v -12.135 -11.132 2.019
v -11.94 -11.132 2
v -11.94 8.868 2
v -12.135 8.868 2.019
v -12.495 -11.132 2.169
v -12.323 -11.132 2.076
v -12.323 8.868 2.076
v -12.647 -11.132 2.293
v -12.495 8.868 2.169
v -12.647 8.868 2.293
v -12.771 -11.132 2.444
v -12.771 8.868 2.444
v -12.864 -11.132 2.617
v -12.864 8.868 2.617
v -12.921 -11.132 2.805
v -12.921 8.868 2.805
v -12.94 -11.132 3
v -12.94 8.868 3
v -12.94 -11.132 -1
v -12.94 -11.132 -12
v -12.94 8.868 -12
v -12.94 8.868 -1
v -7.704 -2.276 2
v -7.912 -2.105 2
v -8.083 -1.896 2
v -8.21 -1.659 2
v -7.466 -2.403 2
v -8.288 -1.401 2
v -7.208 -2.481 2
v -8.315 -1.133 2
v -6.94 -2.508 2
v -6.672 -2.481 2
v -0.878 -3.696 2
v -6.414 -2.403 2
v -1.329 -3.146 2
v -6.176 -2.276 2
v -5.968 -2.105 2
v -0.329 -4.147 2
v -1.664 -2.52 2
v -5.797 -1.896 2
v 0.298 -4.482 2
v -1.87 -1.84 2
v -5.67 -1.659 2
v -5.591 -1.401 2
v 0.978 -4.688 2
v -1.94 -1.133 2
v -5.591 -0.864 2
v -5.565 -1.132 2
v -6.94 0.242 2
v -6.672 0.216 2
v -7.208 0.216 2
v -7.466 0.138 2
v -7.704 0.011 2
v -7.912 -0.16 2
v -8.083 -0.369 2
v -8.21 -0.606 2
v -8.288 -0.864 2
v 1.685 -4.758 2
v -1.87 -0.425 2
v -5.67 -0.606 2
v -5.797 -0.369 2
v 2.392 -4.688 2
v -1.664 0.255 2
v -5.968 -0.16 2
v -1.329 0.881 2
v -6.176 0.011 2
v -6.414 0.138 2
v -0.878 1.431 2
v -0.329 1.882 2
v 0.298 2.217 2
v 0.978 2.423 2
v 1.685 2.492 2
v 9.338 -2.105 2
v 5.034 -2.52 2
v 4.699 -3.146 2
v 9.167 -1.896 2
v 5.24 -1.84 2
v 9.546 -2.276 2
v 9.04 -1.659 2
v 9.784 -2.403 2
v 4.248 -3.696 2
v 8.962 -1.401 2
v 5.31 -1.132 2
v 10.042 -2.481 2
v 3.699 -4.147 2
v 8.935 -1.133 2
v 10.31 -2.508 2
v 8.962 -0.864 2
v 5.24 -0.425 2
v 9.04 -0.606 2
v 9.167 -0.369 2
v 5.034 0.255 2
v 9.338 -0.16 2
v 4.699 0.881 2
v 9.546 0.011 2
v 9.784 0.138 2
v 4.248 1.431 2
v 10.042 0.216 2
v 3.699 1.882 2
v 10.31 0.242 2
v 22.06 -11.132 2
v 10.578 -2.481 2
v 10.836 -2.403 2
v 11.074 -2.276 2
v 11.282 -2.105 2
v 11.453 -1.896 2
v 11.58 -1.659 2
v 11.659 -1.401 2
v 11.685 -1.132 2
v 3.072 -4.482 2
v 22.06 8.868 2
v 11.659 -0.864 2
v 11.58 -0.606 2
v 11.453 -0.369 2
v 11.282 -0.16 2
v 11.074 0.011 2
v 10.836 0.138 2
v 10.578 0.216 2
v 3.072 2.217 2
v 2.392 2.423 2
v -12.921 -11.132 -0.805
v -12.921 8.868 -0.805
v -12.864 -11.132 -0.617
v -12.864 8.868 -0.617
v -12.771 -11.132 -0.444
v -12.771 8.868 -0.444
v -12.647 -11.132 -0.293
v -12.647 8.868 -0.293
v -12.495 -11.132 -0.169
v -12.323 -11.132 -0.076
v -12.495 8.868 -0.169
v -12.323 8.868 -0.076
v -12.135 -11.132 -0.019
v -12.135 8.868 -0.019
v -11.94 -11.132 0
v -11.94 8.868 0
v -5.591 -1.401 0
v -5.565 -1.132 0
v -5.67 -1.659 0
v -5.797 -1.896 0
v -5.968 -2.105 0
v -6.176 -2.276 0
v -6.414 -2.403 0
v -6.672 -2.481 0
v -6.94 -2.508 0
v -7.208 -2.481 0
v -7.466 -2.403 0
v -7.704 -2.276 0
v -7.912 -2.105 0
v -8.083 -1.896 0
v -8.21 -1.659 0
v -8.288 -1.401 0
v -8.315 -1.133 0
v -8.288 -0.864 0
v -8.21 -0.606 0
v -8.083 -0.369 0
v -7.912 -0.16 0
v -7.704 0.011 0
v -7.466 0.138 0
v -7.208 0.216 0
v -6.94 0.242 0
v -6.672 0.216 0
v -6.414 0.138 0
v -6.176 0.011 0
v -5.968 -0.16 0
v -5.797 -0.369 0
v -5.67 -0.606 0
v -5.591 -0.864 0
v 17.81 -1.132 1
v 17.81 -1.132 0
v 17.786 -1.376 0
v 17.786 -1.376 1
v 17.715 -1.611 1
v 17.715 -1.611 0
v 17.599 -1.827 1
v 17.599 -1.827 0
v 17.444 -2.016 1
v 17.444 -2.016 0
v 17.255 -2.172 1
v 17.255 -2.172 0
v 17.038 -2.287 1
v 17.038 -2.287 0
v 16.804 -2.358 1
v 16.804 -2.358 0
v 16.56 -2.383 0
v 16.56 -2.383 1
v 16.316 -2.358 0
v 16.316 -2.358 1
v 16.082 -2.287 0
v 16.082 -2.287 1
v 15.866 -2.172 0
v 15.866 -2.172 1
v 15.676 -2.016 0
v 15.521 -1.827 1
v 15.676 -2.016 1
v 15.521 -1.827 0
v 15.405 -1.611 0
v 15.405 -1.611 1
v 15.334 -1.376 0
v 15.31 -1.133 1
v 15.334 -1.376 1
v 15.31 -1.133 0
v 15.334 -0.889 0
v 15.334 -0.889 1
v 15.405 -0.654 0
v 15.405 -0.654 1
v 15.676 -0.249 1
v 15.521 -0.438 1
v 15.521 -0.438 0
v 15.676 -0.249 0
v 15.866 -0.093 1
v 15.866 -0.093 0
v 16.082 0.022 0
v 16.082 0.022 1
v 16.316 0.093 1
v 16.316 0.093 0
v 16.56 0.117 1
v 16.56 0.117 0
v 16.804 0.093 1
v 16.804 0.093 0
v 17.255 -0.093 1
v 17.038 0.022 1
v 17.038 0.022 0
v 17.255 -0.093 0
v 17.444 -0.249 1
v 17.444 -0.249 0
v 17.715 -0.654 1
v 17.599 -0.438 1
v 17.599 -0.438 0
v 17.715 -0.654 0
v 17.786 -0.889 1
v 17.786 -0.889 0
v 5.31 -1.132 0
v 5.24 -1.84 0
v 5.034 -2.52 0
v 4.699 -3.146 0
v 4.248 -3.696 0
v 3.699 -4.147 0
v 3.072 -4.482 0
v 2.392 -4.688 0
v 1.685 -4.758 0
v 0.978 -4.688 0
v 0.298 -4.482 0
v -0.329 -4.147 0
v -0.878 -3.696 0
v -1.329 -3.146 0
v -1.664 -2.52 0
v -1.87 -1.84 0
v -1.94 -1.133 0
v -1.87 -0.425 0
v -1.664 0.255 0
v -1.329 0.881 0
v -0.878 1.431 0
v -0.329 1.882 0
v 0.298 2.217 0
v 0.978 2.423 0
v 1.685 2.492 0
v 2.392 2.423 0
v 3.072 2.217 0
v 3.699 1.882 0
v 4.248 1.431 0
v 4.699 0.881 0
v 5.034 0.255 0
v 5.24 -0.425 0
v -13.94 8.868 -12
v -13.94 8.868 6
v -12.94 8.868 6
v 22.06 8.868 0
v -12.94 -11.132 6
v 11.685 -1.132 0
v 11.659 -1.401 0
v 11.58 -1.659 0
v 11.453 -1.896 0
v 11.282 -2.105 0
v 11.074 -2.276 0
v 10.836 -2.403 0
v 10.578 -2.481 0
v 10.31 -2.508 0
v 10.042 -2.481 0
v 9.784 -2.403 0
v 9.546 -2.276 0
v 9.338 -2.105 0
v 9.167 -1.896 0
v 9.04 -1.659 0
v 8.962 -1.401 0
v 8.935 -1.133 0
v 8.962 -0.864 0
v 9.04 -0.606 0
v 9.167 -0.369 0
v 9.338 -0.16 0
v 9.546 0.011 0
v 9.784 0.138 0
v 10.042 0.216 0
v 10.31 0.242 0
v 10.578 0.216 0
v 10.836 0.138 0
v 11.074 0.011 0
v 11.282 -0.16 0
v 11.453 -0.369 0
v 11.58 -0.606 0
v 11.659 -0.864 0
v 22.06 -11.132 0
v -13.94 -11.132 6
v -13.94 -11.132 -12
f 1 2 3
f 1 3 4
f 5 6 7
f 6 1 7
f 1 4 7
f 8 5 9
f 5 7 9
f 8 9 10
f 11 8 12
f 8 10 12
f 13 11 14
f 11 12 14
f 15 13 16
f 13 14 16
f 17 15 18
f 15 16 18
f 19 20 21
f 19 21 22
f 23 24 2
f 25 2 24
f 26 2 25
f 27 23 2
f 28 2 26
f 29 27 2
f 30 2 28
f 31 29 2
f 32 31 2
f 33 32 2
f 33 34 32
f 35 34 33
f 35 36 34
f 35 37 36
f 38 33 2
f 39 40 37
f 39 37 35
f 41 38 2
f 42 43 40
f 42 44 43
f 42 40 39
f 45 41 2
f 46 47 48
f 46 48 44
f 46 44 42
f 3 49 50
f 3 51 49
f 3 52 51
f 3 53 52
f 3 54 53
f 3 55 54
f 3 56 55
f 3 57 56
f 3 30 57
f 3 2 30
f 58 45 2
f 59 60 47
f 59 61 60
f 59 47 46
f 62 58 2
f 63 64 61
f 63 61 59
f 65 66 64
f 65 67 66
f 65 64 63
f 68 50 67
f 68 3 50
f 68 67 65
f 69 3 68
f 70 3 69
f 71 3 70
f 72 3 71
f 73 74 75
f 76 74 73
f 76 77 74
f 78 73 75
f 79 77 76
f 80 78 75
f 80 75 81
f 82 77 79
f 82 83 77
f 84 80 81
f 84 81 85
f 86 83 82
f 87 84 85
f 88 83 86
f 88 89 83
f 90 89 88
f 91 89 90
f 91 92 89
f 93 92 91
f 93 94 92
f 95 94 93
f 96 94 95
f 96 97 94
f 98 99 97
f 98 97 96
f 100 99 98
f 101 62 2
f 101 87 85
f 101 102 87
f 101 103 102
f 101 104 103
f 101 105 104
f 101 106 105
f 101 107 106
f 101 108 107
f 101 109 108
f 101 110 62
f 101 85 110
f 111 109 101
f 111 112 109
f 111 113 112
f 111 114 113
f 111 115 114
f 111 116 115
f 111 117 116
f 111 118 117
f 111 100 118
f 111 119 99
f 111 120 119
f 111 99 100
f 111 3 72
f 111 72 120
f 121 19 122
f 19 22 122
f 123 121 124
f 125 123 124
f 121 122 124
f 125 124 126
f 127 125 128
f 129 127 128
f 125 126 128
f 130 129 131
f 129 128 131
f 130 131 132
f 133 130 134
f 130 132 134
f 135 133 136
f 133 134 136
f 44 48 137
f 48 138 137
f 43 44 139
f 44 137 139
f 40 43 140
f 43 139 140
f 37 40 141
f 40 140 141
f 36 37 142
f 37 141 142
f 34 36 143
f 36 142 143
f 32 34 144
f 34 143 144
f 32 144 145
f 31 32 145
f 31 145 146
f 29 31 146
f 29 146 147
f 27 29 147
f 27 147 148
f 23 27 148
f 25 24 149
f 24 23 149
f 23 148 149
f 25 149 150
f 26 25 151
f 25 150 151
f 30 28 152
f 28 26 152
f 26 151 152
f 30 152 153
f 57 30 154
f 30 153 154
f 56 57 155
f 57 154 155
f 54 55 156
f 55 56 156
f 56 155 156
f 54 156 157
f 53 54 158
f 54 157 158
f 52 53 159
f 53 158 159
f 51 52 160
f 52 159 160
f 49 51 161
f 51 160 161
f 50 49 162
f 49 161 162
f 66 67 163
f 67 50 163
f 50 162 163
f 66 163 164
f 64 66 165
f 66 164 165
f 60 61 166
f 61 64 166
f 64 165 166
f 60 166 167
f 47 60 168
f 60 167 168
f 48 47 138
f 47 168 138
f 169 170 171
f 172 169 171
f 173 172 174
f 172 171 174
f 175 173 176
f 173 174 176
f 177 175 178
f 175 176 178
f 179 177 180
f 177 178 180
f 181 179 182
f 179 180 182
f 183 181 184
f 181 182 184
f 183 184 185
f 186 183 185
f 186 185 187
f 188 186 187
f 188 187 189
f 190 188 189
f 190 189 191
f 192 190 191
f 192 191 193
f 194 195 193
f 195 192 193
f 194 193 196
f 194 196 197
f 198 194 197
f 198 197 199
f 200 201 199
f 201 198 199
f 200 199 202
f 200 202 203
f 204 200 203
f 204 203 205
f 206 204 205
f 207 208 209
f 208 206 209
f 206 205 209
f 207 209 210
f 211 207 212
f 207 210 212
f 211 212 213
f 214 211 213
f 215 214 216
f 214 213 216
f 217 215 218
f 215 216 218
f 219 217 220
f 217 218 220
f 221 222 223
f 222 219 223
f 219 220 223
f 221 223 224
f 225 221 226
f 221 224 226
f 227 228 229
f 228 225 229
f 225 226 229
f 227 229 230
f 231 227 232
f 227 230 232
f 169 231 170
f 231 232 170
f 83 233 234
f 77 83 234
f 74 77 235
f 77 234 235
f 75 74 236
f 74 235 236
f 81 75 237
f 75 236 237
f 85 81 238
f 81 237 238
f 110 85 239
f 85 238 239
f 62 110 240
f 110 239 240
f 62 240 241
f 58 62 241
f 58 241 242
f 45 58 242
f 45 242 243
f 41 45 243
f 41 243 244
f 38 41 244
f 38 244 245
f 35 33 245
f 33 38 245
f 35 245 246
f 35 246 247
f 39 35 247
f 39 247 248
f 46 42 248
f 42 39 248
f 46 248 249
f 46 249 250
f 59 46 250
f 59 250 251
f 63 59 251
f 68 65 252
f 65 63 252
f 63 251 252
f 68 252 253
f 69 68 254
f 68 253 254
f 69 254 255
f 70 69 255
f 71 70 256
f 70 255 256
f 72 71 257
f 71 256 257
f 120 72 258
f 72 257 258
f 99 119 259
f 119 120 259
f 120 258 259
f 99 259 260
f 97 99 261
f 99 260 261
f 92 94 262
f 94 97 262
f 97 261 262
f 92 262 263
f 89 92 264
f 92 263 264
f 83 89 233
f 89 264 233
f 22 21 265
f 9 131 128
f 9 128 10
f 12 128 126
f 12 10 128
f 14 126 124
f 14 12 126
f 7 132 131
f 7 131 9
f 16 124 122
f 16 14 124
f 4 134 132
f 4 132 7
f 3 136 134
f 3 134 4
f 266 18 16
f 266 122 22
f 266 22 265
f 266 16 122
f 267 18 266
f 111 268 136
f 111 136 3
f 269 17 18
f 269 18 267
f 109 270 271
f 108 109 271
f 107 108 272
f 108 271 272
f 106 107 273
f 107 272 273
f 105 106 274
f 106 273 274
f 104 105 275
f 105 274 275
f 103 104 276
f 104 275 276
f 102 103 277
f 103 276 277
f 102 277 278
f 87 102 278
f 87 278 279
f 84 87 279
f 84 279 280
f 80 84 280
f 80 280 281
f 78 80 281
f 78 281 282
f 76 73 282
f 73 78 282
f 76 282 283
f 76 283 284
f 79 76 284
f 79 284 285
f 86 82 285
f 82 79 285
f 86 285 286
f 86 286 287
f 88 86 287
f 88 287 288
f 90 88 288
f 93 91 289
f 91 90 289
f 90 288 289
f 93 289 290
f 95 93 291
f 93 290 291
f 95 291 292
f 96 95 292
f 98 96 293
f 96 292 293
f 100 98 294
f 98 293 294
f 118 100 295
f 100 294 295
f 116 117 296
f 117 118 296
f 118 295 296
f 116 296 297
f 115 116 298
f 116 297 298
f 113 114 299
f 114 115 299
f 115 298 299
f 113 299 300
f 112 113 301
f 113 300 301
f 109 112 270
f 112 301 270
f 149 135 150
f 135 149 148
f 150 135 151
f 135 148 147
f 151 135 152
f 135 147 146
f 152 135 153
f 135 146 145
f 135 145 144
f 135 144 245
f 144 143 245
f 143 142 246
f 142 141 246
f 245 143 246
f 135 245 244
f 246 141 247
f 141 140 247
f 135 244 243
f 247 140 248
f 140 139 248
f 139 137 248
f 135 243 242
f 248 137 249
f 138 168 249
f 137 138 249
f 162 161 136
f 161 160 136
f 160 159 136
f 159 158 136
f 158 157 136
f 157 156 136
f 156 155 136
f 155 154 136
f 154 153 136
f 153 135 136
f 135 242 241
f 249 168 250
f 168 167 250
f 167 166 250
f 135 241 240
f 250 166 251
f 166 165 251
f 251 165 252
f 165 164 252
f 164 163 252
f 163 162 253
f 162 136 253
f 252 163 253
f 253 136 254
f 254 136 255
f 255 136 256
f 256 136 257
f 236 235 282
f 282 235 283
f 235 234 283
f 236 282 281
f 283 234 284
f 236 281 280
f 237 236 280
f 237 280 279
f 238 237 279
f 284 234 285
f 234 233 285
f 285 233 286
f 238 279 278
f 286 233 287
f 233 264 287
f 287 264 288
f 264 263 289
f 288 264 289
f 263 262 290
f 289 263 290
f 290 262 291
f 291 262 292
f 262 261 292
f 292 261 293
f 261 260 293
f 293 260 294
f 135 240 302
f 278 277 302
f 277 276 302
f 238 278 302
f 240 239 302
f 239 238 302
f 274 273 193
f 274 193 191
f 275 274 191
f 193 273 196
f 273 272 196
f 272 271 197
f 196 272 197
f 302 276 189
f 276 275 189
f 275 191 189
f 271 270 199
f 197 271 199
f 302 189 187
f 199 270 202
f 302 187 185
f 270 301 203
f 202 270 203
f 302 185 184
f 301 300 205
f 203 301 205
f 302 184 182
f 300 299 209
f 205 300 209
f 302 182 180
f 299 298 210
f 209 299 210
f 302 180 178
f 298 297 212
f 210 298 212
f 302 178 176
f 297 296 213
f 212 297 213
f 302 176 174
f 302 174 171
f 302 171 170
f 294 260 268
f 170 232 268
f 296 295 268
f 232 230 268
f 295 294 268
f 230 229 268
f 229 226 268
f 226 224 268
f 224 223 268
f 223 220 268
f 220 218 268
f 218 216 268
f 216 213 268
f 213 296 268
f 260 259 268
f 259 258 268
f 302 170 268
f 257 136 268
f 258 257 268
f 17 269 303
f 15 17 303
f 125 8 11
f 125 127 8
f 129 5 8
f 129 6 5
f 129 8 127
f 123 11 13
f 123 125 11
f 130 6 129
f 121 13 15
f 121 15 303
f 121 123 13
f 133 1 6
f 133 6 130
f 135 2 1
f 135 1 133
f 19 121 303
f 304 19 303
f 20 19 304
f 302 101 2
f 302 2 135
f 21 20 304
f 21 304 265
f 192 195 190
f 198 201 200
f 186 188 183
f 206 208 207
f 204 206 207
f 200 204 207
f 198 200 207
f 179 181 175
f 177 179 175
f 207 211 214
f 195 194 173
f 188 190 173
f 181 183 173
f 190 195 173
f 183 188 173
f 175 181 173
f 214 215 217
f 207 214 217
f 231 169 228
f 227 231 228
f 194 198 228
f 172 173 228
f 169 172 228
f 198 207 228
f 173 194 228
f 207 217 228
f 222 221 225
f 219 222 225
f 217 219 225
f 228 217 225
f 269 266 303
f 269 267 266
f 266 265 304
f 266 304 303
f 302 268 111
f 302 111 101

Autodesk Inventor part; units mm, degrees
ref_plane "YZ Plane" through (0, 0, 0) normal (1, 0, 0) x (0, 1, 0)
ref_plane "XZ Plane" through (0, 0, 0) normal (0, 1, 0) x (-1, 0, 0)
ref_plane "XY Plane" through (0, 0, 0) normal (0, 0, 1) x (1, 0, 0)
sketch "Sketch1" plane through (0, 0, 0) normal (0, 0, 1) x (1, 0, 0)
  line L0 (-12.9399, 8.8675) -> (22.0601, 8.8675)
  line L1 (22.0601, 8.8675) -> (22.0601, -11.1325)
  line L2 (22.0601, -11.1325) -> (-12.9399, -11.1325)
  line L3 (-12.9399, -11.1325) -> (-12.9399, 8.8675)
  circle A0 centre (-6.9399, -1.1325) radius 1.375
  circle A1 centre (10.3101, -1.1325) radius 1.375
  circle A2 centre (1.6851, -1.1325) radius 3.625
  circle A3 centre (16.5601, -1.1325) radius 1.25
  point P0 (0, 0)
  dimension "d0" = 20
  dimension "d1" = 35
  dimension "d2" = 7.25
  dimension "d3" = 2.75
  dimension "d4" = 2.75
  dimension "d5" = 8.625
  dimension "d6" = 0
  dimension "d7" = 8.625
  dimension "d8" = 0
  dimension "d9" = 6
  dimension "d10" = 10
  dimension "d20" = 2.5
  dimension "d21" = 14.875
  dimension "d24" = 6.25
extrude "Extrusion1" add sketch "Sketch1" along normal blind 2 contours L0 L1 L2 L3 | A3
sketch "Sketch2" plane through (-12.9399, -11.1325, 0) normal (-1, 0, 0) x (0, 0, 1)
  line L0 (-12, 20) -> (6, 20)
  line L1 (6, 20) -> (6, 0)
  line L2 (6, 0) -> (-12, 0)
  line L3 (-12, 0) -> (-12, 20)
  line L4 (0, 0) -> (0, 20) projected
  line L5 (2, 20) -> (2, 0) projected
  point P0 (0, 11.1325)
  dimension "d13" = 12
  dimension "d14" = 4
  dimension "d15" = 0
  dimension "d16" = 0
extrude "Extrusion2" add sketch "Sketch2" along normal blind 1
fillet "Fillet1" radius 1 2 edges at (-12.9399, -1.1325, 2) (-12.9399, -1.1325, 0)
extrude "Extrusion3" cut sketch "Sketch1" along normal blind 1 contours A3
equation "\"d7\" = d5"
properties part number "tac switch test"
